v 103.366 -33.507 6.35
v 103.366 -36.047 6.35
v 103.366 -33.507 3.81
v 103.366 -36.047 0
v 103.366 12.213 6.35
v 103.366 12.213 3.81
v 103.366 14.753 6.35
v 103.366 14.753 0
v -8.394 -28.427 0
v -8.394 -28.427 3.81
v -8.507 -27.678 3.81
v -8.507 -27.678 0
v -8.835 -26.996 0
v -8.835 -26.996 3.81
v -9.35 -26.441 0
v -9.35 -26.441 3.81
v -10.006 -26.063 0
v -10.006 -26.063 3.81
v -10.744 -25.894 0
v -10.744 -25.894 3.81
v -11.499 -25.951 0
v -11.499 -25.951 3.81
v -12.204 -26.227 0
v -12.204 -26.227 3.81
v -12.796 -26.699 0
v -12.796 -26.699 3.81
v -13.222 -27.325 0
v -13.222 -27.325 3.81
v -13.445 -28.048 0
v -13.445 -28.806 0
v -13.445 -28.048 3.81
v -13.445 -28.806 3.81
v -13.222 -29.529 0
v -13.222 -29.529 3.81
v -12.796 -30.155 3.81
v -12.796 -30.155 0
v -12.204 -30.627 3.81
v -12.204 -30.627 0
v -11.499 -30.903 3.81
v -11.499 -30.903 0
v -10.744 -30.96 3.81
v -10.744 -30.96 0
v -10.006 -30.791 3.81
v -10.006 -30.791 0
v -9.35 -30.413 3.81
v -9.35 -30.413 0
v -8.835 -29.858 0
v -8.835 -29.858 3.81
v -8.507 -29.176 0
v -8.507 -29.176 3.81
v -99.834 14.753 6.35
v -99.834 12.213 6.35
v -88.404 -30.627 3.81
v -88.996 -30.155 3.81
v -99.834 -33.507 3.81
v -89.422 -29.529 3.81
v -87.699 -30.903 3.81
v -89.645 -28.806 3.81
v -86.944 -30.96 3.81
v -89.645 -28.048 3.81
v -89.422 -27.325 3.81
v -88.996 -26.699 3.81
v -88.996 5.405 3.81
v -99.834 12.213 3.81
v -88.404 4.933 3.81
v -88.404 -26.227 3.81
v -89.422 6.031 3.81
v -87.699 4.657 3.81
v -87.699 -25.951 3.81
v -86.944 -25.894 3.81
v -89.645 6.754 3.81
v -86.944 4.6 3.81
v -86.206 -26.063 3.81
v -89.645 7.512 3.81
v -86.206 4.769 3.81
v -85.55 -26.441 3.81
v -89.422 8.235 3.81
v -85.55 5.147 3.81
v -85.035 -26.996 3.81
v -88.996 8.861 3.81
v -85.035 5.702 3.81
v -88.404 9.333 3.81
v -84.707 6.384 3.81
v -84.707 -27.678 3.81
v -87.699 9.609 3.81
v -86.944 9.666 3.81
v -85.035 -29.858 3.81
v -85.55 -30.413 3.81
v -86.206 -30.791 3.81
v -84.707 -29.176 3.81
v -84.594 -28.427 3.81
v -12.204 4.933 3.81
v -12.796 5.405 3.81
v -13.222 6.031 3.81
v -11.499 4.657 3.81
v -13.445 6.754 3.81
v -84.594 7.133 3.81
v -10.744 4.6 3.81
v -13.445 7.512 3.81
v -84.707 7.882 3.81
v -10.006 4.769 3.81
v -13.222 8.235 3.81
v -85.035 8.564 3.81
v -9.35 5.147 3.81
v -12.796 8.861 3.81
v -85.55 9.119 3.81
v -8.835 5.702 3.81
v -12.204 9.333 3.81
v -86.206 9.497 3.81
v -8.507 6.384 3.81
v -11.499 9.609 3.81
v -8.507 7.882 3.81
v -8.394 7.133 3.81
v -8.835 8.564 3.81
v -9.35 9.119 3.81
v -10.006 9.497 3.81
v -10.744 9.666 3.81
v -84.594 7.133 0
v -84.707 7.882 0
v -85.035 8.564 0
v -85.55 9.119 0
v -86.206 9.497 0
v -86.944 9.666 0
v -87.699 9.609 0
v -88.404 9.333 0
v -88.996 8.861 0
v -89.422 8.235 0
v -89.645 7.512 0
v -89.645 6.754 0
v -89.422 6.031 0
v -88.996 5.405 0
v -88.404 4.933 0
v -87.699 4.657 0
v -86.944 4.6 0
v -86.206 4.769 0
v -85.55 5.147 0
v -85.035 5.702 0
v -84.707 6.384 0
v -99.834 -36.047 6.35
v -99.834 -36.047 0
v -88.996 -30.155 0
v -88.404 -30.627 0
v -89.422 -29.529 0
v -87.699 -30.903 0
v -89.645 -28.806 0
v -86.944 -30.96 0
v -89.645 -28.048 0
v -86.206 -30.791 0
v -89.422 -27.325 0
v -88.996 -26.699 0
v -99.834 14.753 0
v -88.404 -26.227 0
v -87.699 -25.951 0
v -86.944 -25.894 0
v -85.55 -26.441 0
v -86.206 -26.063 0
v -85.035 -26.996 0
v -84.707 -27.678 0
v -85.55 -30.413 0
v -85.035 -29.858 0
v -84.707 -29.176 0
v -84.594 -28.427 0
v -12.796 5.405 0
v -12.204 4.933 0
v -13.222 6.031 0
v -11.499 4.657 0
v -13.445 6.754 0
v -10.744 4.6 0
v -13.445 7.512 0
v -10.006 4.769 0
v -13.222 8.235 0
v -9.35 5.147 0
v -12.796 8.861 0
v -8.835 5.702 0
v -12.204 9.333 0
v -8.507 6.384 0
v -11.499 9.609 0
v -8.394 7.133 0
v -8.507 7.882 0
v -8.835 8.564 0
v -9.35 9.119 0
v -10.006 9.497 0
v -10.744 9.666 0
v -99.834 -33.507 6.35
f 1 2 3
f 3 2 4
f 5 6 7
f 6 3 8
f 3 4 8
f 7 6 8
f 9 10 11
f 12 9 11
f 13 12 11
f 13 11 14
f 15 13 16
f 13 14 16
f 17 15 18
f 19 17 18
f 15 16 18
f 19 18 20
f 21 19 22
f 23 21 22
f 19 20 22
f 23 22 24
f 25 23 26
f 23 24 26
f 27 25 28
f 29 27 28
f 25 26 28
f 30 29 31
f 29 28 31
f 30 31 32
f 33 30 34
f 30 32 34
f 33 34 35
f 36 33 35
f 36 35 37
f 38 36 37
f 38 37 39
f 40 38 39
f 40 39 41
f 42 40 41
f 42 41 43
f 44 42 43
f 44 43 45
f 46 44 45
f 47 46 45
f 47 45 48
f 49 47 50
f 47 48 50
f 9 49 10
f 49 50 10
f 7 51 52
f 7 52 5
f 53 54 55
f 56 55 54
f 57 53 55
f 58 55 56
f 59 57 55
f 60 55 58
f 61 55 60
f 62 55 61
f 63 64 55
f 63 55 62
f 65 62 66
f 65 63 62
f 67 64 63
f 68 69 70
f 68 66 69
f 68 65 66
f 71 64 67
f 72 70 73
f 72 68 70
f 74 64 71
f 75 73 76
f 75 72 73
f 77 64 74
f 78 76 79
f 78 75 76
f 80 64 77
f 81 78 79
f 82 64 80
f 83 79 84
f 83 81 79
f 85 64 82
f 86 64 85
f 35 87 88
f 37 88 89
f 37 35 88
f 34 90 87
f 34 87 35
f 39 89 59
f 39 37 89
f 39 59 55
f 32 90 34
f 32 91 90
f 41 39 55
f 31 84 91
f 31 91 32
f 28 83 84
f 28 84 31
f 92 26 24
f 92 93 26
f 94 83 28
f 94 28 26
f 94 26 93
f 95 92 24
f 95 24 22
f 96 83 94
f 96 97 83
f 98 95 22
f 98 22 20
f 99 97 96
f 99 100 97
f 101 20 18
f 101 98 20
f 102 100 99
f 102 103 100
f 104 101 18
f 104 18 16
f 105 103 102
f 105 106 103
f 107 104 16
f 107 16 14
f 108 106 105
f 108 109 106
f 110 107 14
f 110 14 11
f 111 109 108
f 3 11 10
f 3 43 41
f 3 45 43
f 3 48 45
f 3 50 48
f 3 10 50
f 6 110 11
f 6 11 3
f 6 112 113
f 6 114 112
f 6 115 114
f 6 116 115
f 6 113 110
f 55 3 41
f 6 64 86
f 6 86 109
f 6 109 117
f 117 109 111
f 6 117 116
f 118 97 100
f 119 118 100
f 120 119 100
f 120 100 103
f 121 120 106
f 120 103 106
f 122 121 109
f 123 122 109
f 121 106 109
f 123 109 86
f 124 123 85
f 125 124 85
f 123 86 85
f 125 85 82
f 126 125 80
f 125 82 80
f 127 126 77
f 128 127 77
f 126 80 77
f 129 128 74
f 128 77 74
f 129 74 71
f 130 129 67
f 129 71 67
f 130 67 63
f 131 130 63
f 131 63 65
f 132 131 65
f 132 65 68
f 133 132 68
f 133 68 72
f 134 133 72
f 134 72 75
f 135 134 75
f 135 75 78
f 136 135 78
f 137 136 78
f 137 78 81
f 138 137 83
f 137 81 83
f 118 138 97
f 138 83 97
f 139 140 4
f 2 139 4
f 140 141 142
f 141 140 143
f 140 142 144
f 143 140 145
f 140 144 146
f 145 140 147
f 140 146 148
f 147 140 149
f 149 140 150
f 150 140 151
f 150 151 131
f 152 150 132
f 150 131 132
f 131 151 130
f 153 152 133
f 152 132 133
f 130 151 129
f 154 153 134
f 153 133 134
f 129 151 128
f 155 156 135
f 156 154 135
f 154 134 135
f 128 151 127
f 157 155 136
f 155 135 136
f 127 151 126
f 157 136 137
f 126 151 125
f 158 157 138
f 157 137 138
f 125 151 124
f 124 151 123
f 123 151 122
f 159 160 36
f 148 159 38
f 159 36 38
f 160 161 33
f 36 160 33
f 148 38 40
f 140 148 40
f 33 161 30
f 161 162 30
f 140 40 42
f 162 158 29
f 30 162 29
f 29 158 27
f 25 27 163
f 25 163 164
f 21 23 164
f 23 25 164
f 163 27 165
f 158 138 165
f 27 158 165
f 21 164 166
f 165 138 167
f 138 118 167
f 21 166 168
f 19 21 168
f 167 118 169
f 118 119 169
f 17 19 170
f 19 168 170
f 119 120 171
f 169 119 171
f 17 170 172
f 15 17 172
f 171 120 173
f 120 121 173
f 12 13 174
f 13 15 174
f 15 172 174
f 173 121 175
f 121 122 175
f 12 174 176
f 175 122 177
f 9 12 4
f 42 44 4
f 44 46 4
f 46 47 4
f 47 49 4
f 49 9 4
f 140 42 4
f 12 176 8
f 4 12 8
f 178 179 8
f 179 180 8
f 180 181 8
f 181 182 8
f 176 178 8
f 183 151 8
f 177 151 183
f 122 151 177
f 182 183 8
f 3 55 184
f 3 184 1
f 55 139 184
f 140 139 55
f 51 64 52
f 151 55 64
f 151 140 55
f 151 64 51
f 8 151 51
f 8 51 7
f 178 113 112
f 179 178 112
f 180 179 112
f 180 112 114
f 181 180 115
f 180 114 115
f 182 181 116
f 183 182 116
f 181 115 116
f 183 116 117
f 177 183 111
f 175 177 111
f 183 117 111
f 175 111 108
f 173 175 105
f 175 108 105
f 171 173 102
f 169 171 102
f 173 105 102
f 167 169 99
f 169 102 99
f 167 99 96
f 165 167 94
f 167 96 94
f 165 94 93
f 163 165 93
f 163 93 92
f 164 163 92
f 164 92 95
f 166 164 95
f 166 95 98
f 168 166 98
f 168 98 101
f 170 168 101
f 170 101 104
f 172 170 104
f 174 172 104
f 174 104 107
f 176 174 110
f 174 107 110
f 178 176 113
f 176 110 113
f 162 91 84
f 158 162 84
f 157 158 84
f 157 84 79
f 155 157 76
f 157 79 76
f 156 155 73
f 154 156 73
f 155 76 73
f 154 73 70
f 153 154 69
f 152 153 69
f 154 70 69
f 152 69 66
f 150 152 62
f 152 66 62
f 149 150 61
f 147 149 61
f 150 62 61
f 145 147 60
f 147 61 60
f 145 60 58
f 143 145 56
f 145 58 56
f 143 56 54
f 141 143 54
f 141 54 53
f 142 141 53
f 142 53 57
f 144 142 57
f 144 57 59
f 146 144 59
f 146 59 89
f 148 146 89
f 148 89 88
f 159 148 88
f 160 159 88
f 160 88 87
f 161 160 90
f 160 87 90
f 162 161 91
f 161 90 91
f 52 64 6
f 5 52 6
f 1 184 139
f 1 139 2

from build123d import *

# Parameters (mm, degrees)
F0_W     = 203.2
F0_H     = 50.8
F1_DEPTH = 3.81
F2_W     = 203.2
F2_H     = 2.54
F3_DEPTH = 2.54
F4_R     = 2.54
F5_DEPTH = 3.81


with BuildPart() as f1:
    # F0 (on Top) → F1 (new body)
    with BuildSketch(Plane.XY):
        with Locations((1.766223, -10.64699)):
            Rectangle(F0_W, F0_H)
    extrude(amount=F1_DEPTH)

    # F2 (on face) → F3 (join)
    with BuildSketch(Plane.XY.offset(3.81)):
        with Locations((1.766223, 13.48301)):
            Rectangle(F2_W, F2_H)
        with Locations((1.766223, -34.77699)):
            Rectangle(F2_W, F2_H)
    extrude(amount=F3_DEPTH)

    # F4 (on face) → F5 (cut)
    with BuildSketch(Plane.XY.offset(3.81)):
        with Locations((-87.133777, 7.13301)):
            Circle(F4_R)
        with Locations((-87.133777, -28.42699)):
            Circle(F4_R)
        with Locations((-10.933777, 7.13301)):
            Circle(F4_R)
        with Locations((-10.933777, -28.42699)):
            Circle(F4_R)
    extrude(amount=-F5_DEPTH, mode=Mode.SUBTRACT)


solid = f1.part
